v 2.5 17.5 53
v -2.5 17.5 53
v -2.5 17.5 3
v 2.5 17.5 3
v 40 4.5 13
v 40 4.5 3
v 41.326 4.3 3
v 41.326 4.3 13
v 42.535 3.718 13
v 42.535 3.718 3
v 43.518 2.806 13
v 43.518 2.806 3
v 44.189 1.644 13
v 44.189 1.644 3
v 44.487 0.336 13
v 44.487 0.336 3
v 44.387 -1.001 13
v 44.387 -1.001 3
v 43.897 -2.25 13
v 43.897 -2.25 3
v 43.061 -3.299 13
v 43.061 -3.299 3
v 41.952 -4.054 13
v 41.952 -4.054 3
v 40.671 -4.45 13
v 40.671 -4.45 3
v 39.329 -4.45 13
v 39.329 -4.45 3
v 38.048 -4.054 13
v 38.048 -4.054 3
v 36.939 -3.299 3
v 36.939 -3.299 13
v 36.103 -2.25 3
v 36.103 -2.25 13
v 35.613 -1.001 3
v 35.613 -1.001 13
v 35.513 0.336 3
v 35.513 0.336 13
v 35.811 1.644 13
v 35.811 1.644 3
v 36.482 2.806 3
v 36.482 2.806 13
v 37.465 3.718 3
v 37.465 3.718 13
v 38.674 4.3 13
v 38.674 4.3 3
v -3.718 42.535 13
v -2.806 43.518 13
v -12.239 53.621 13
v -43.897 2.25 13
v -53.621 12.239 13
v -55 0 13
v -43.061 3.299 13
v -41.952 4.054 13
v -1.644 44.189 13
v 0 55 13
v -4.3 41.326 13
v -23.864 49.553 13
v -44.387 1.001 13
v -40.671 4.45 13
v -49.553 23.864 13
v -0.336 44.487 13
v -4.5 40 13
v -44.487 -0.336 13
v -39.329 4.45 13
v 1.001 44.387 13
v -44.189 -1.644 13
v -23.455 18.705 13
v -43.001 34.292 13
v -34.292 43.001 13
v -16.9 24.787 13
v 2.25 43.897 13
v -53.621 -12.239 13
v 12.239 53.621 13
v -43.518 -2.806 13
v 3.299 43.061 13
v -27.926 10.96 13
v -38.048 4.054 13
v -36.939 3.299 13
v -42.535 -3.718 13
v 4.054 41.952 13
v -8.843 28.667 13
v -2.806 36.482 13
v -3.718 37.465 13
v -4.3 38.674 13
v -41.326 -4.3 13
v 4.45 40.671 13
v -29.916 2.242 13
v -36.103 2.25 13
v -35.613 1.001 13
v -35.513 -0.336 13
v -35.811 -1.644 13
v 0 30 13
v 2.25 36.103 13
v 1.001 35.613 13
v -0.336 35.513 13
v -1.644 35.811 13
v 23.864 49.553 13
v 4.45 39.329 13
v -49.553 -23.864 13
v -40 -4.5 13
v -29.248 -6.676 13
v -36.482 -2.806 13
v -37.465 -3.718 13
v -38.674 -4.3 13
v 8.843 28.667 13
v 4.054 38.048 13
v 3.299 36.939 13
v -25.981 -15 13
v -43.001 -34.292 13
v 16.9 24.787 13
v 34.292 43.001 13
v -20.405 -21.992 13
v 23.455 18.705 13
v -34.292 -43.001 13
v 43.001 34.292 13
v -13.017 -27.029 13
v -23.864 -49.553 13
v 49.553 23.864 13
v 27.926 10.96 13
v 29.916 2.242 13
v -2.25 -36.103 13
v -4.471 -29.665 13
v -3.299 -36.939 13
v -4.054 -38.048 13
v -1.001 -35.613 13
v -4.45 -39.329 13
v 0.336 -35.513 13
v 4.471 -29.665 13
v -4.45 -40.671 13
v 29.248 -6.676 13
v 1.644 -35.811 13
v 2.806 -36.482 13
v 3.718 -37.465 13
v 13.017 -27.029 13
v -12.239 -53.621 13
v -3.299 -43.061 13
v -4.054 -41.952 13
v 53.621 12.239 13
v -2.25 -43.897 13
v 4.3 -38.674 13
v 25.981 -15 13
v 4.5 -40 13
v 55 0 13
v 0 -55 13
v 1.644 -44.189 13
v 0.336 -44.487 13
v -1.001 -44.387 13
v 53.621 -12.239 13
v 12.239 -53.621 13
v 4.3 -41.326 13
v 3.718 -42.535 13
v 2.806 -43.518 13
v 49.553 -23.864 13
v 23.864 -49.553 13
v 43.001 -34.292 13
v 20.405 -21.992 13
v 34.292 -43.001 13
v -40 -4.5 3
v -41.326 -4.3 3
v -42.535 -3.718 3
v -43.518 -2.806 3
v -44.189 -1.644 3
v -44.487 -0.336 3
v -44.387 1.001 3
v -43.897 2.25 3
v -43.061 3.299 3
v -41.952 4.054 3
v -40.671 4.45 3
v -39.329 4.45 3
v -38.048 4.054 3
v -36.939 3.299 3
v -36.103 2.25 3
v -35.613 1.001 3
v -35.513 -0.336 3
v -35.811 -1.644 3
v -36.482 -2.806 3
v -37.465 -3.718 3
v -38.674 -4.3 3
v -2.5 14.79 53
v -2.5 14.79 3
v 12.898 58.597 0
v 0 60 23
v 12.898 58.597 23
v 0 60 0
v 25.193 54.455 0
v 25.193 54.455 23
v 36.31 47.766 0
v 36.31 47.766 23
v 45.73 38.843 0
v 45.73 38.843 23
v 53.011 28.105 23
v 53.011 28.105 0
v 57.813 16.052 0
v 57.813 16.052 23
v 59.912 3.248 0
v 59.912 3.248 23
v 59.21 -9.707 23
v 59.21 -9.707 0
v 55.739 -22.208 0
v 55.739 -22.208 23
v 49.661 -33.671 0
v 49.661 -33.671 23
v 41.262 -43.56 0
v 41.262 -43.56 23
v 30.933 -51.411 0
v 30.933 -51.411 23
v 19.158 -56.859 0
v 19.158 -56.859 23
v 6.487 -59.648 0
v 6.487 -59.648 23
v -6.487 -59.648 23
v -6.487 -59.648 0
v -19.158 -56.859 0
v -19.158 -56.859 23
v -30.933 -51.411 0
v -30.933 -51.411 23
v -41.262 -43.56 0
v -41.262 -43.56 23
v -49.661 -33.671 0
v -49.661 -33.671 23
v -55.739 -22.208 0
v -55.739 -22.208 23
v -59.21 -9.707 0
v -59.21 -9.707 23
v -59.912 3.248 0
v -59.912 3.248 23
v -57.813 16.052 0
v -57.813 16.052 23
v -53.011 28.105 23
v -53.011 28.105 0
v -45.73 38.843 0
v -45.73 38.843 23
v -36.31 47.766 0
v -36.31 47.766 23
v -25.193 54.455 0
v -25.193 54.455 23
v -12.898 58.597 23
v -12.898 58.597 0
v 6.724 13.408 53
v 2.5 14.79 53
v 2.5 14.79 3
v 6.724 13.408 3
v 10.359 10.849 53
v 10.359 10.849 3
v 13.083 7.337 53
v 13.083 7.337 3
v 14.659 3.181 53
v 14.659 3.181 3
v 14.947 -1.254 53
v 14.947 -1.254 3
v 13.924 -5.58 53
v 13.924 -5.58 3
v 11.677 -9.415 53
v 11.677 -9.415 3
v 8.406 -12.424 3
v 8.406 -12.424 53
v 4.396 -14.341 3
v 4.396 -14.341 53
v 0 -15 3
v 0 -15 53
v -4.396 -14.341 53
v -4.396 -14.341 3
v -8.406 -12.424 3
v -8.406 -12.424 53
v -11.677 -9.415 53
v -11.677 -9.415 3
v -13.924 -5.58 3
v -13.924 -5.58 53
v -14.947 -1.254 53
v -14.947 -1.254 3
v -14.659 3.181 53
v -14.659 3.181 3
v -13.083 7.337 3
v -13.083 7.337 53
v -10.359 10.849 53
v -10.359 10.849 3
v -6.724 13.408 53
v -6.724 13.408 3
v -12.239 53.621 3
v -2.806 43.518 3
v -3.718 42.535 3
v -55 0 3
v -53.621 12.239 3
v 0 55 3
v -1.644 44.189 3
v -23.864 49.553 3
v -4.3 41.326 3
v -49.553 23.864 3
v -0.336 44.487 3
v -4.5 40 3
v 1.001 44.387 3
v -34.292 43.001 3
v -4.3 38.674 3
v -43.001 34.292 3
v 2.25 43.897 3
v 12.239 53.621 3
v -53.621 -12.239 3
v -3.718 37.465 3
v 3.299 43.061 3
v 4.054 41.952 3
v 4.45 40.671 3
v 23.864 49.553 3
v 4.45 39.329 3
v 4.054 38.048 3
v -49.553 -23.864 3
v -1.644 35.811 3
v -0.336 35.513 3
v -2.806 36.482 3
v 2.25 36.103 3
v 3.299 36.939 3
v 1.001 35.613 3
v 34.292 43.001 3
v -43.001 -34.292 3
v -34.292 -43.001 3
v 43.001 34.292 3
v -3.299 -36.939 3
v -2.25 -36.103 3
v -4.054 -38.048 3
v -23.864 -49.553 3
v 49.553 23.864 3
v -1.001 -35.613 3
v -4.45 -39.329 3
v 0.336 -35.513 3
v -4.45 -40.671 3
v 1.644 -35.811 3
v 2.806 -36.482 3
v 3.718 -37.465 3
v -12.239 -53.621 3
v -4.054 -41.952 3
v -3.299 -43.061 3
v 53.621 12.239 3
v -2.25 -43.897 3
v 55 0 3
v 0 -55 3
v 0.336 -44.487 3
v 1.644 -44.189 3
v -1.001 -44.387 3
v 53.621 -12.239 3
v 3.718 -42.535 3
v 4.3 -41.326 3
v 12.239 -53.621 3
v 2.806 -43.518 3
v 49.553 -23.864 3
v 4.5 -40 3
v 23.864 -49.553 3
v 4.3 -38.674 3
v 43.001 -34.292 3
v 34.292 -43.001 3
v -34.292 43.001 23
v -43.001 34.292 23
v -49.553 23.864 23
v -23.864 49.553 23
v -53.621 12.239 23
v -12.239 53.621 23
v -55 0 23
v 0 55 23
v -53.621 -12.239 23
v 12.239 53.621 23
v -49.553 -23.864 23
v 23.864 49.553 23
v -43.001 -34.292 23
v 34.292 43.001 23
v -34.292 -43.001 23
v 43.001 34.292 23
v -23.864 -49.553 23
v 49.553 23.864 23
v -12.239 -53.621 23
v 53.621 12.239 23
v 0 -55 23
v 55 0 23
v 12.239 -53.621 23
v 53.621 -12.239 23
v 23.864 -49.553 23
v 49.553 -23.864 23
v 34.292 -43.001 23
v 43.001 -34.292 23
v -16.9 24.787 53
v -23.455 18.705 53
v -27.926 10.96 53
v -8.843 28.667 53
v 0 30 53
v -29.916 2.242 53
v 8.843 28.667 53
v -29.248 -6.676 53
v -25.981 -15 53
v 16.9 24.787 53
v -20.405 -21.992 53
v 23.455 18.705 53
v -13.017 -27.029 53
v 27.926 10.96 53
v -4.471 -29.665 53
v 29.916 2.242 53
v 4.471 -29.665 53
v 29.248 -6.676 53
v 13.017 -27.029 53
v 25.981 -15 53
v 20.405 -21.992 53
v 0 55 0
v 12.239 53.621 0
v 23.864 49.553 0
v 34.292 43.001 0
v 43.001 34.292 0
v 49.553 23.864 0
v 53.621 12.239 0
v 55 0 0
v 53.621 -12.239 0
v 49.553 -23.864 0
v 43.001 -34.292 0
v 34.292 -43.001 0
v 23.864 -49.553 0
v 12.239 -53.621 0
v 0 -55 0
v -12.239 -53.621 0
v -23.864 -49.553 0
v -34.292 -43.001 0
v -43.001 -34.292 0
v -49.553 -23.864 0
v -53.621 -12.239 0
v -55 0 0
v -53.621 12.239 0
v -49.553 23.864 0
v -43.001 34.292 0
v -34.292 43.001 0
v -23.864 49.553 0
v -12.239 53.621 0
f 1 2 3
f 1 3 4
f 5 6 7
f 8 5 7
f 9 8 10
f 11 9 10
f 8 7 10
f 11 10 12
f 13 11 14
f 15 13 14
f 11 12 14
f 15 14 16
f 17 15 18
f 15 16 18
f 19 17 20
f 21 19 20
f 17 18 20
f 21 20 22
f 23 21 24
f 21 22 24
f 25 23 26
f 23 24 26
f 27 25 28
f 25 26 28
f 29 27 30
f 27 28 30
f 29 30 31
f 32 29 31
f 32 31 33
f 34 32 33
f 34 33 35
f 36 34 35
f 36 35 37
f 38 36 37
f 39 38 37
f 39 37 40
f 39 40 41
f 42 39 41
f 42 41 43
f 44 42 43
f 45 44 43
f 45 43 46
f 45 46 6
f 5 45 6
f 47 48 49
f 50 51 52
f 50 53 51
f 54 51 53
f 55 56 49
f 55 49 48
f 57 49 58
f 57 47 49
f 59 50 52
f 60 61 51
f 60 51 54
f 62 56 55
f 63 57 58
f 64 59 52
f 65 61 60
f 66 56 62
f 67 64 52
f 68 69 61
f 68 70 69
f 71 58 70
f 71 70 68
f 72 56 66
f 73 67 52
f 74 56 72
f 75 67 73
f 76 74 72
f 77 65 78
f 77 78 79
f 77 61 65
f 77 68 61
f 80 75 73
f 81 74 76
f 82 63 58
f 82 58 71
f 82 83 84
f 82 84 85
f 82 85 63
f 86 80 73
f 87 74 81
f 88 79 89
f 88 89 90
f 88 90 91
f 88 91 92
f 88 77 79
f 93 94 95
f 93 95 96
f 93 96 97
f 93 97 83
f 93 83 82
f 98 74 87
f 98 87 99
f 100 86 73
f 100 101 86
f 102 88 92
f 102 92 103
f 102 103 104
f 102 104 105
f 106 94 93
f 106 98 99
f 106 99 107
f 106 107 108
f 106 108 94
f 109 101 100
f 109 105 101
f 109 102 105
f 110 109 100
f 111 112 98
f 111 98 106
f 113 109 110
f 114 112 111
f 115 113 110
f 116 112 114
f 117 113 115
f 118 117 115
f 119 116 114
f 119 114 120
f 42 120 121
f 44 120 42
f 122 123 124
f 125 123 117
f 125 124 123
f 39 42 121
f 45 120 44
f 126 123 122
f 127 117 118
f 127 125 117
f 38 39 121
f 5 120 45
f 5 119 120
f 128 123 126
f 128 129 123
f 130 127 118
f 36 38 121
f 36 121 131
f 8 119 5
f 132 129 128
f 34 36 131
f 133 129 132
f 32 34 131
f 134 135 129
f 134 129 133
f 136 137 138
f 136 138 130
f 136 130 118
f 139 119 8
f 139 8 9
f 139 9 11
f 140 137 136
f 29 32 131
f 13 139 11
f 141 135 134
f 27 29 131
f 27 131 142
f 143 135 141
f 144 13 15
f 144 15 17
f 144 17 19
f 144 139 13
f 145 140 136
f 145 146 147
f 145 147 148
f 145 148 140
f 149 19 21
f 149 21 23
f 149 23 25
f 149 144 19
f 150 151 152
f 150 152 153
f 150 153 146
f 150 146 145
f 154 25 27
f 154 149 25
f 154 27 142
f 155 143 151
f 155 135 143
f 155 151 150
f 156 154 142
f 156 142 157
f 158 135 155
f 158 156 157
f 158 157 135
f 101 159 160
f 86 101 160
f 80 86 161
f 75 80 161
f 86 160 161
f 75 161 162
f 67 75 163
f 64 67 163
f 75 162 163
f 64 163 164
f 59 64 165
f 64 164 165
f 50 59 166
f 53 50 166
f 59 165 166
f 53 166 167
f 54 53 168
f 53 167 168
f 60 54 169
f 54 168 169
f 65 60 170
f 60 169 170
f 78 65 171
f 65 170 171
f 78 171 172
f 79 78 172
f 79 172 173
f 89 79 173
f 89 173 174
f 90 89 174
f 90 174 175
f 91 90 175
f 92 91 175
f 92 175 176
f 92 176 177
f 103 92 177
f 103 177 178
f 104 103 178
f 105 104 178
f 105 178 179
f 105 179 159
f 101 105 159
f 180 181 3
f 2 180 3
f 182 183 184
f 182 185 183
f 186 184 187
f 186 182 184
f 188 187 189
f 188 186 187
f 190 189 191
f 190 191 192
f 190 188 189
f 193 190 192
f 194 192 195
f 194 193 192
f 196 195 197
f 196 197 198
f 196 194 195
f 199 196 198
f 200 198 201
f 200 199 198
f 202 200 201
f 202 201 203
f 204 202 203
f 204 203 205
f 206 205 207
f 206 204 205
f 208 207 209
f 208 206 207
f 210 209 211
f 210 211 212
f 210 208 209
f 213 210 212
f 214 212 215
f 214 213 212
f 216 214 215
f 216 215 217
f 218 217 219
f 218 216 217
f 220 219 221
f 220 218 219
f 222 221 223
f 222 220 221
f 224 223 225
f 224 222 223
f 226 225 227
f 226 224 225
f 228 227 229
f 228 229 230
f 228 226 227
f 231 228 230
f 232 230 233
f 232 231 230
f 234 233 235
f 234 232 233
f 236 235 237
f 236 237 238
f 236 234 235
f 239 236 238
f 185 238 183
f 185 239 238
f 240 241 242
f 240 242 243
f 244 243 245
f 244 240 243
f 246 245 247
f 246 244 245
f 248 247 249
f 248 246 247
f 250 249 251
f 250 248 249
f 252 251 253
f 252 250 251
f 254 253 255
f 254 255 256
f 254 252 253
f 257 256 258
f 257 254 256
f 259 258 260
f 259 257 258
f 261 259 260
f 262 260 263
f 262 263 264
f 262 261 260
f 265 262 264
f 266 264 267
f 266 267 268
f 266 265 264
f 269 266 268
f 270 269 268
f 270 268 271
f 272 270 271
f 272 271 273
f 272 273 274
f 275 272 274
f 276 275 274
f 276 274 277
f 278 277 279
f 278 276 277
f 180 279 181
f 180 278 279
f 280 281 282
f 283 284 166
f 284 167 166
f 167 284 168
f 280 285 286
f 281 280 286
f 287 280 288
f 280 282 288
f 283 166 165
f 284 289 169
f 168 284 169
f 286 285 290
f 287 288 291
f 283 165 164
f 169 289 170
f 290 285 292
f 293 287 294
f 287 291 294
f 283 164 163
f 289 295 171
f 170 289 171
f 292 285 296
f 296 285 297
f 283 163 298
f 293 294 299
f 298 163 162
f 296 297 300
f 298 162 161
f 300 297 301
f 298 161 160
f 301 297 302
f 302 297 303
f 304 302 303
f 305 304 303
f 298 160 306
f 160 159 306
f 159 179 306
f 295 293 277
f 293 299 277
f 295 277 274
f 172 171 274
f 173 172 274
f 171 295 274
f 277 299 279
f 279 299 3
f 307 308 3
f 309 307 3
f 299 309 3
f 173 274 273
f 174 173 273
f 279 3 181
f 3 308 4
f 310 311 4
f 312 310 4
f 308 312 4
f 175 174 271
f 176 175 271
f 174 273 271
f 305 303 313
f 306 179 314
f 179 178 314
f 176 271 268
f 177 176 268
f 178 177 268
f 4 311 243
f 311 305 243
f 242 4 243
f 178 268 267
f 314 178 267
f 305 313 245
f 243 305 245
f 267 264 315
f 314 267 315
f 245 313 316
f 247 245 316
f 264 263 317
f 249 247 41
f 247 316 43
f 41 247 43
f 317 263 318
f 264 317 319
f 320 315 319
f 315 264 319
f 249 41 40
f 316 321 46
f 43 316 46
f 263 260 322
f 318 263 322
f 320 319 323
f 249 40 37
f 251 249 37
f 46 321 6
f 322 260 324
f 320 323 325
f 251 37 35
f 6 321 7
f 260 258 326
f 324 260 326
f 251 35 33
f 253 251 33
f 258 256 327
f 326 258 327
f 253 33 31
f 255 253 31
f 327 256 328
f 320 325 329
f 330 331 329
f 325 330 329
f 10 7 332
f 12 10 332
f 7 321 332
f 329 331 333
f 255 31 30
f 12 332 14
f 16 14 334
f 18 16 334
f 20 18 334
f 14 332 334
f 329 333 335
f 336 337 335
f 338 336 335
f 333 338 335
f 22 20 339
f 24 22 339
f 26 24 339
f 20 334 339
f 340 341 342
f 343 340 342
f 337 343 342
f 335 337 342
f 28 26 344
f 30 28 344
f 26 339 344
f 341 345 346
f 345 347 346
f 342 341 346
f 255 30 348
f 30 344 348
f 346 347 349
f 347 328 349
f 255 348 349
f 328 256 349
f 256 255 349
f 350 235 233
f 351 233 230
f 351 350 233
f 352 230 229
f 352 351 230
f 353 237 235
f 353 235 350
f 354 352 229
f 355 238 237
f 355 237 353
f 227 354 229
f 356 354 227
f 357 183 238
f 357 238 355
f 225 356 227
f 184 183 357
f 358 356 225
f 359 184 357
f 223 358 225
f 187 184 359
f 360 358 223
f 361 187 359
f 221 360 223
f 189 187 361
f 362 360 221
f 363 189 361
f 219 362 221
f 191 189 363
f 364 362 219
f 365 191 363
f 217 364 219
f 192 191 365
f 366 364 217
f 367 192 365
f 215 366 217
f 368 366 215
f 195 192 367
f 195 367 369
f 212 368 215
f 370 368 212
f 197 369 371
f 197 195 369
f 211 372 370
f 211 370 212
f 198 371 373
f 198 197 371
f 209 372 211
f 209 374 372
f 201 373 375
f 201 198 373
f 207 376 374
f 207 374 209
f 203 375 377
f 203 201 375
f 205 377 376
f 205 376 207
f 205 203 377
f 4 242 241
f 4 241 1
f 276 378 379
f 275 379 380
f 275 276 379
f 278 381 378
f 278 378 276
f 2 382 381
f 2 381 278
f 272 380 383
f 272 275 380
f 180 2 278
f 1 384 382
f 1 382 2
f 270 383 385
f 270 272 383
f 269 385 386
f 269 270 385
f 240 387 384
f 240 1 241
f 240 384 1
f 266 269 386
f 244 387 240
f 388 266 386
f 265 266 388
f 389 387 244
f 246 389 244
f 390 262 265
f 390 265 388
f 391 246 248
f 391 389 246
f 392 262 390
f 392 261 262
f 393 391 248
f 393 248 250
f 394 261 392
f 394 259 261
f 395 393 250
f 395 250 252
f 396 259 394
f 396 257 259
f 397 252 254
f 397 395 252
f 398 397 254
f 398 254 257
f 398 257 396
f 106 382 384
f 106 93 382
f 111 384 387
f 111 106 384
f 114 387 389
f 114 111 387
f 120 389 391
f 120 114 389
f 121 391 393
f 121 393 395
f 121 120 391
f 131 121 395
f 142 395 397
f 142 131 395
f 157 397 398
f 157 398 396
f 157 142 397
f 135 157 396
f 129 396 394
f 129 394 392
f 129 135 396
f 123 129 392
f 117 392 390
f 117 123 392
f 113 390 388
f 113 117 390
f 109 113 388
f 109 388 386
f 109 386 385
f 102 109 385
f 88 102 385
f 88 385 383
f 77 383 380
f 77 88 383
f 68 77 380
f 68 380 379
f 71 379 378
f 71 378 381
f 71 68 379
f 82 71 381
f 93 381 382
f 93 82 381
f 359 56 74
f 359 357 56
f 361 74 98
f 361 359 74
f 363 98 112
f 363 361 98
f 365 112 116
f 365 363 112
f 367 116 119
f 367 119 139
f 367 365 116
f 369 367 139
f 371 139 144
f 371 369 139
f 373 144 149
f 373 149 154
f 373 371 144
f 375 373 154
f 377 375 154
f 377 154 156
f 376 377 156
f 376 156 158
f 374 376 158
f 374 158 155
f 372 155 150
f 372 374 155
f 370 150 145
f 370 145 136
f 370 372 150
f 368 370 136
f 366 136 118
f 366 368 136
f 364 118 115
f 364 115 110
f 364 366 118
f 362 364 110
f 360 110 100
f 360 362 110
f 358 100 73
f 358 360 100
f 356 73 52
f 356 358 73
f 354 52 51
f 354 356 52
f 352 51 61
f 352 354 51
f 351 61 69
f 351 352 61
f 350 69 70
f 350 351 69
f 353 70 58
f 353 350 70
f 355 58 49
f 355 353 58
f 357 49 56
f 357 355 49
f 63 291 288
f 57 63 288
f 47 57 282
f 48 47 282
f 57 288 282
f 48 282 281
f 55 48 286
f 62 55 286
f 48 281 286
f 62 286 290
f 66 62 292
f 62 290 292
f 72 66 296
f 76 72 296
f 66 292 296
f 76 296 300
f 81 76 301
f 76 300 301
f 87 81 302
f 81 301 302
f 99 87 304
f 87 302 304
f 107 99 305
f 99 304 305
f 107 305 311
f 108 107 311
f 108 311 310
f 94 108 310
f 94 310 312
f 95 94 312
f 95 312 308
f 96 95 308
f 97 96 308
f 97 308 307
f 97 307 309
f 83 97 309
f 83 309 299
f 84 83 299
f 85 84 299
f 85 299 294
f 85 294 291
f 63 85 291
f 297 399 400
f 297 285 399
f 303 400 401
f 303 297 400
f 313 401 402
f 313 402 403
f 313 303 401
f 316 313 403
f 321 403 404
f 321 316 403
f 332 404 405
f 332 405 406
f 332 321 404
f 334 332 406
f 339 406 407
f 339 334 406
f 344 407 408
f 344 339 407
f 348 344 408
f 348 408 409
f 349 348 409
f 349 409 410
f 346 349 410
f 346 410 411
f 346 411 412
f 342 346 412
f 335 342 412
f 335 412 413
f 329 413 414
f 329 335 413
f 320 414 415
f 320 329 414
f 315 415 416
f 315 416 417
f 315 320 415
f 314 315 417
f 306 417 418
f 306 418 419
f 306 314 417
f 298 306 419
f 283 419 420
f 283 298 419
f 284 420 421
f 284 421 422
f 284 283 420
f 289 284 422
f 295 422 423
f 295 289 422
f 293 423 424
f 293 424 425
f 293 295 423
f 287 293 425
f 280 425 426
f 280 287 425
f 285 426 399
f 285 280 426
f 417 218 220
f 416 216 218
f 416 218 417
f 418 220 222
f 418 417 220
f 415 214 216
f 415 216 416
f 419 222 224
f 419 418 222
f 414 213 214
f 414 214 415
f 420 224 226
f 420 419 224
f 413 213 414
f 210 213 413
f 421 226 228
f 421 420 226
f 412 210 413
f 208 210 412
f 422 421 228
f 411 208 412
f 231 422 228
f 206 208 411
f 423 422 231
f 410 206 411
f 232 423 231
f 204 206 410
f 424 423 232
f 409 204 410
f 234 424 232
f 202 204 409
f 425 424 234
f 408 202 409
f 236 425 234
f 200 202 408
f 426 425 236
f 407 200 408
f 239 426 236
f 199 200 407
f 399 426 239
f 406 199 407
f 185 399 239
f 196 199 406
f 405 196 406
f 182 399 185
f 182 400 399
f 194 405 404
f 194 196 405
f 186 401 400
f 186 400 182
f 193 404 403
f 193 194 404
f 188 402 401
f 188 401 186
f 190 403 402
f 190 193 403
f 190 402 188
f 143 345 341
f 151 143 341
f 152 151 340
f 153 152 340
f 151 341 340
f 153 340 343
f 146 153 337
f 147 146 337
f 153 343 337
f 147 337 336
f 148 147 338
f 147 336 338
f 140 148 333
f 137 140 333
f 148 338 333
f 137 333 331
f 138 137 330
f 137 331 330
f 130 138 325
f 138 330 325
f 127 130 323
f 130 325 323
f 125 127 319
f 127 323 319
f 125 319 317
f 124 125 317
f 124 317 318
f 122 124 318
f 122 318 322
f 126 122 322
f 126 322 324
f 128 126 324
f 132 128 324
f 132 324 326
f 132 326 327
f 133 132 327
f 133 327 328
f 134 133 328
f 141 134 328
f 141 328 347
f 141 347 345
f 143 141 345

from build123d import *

# Parameters (mm, degrees)
SKETCH2_W            = 5
SKETCH2_H            = 5
CUT_EXTRUDE1_DEPTH   = 54
M8_CLEARANCE_HOLE2_D = 9
CIRPATTERN1_COUNT    = 4


with BuildPart() as part:
    # Sketch1 → Revolve1 (revolve)
    with BuildSketch(Plane(origin=(0, 0, 0), x_dir=(0, 0, -1), z_dir=(1, 0, 0))):
        Polygon((-3, 15), (-53, 15), (-53, 30), (-13, 30), (-13, 55), (-23, 55), (-23, 60), (0, 60), (0, 55), (-3, 55), (-3, 33.885514375), align=None)
    revolve(axis=Axis((0, 0, 0), (0, 0, -1)))

    # Sketch2 → Cut-Extrude1 (cut, through all)
    with BuildSketch(Plane.XY.offset(53)):
        with Locations((0, 15)):
            Rectangle(SKETCH2_W, SKETCH2_H)
    extrude(amount=-CUT_EXTRUDE1_DEPTH, mode=Mode.SUBTRACT)

    # M8 Clearance Hole2 (through all)
    with Locations(Plane.XY.offset(13)):
        with Locations((0, 40)):
            m8_clearance_hole2 = Hole(M8_CLEARANCE_HOLE2_D / 2)

    # CirPattern1: M8 Clearance Hole2 ×4 about axis
    cirpattern1_axis = Axis((0, 0, 0), (0, 0, 1))
    for i in range(1, CIRPATTERN1_COUNT):
        add(m8_clearance_hole2.rotate(cirpattern1_axis, i * 360 / CIRPATTERN1_COUNT), mode=Mode.SUBTRACT)


solid = part.part
